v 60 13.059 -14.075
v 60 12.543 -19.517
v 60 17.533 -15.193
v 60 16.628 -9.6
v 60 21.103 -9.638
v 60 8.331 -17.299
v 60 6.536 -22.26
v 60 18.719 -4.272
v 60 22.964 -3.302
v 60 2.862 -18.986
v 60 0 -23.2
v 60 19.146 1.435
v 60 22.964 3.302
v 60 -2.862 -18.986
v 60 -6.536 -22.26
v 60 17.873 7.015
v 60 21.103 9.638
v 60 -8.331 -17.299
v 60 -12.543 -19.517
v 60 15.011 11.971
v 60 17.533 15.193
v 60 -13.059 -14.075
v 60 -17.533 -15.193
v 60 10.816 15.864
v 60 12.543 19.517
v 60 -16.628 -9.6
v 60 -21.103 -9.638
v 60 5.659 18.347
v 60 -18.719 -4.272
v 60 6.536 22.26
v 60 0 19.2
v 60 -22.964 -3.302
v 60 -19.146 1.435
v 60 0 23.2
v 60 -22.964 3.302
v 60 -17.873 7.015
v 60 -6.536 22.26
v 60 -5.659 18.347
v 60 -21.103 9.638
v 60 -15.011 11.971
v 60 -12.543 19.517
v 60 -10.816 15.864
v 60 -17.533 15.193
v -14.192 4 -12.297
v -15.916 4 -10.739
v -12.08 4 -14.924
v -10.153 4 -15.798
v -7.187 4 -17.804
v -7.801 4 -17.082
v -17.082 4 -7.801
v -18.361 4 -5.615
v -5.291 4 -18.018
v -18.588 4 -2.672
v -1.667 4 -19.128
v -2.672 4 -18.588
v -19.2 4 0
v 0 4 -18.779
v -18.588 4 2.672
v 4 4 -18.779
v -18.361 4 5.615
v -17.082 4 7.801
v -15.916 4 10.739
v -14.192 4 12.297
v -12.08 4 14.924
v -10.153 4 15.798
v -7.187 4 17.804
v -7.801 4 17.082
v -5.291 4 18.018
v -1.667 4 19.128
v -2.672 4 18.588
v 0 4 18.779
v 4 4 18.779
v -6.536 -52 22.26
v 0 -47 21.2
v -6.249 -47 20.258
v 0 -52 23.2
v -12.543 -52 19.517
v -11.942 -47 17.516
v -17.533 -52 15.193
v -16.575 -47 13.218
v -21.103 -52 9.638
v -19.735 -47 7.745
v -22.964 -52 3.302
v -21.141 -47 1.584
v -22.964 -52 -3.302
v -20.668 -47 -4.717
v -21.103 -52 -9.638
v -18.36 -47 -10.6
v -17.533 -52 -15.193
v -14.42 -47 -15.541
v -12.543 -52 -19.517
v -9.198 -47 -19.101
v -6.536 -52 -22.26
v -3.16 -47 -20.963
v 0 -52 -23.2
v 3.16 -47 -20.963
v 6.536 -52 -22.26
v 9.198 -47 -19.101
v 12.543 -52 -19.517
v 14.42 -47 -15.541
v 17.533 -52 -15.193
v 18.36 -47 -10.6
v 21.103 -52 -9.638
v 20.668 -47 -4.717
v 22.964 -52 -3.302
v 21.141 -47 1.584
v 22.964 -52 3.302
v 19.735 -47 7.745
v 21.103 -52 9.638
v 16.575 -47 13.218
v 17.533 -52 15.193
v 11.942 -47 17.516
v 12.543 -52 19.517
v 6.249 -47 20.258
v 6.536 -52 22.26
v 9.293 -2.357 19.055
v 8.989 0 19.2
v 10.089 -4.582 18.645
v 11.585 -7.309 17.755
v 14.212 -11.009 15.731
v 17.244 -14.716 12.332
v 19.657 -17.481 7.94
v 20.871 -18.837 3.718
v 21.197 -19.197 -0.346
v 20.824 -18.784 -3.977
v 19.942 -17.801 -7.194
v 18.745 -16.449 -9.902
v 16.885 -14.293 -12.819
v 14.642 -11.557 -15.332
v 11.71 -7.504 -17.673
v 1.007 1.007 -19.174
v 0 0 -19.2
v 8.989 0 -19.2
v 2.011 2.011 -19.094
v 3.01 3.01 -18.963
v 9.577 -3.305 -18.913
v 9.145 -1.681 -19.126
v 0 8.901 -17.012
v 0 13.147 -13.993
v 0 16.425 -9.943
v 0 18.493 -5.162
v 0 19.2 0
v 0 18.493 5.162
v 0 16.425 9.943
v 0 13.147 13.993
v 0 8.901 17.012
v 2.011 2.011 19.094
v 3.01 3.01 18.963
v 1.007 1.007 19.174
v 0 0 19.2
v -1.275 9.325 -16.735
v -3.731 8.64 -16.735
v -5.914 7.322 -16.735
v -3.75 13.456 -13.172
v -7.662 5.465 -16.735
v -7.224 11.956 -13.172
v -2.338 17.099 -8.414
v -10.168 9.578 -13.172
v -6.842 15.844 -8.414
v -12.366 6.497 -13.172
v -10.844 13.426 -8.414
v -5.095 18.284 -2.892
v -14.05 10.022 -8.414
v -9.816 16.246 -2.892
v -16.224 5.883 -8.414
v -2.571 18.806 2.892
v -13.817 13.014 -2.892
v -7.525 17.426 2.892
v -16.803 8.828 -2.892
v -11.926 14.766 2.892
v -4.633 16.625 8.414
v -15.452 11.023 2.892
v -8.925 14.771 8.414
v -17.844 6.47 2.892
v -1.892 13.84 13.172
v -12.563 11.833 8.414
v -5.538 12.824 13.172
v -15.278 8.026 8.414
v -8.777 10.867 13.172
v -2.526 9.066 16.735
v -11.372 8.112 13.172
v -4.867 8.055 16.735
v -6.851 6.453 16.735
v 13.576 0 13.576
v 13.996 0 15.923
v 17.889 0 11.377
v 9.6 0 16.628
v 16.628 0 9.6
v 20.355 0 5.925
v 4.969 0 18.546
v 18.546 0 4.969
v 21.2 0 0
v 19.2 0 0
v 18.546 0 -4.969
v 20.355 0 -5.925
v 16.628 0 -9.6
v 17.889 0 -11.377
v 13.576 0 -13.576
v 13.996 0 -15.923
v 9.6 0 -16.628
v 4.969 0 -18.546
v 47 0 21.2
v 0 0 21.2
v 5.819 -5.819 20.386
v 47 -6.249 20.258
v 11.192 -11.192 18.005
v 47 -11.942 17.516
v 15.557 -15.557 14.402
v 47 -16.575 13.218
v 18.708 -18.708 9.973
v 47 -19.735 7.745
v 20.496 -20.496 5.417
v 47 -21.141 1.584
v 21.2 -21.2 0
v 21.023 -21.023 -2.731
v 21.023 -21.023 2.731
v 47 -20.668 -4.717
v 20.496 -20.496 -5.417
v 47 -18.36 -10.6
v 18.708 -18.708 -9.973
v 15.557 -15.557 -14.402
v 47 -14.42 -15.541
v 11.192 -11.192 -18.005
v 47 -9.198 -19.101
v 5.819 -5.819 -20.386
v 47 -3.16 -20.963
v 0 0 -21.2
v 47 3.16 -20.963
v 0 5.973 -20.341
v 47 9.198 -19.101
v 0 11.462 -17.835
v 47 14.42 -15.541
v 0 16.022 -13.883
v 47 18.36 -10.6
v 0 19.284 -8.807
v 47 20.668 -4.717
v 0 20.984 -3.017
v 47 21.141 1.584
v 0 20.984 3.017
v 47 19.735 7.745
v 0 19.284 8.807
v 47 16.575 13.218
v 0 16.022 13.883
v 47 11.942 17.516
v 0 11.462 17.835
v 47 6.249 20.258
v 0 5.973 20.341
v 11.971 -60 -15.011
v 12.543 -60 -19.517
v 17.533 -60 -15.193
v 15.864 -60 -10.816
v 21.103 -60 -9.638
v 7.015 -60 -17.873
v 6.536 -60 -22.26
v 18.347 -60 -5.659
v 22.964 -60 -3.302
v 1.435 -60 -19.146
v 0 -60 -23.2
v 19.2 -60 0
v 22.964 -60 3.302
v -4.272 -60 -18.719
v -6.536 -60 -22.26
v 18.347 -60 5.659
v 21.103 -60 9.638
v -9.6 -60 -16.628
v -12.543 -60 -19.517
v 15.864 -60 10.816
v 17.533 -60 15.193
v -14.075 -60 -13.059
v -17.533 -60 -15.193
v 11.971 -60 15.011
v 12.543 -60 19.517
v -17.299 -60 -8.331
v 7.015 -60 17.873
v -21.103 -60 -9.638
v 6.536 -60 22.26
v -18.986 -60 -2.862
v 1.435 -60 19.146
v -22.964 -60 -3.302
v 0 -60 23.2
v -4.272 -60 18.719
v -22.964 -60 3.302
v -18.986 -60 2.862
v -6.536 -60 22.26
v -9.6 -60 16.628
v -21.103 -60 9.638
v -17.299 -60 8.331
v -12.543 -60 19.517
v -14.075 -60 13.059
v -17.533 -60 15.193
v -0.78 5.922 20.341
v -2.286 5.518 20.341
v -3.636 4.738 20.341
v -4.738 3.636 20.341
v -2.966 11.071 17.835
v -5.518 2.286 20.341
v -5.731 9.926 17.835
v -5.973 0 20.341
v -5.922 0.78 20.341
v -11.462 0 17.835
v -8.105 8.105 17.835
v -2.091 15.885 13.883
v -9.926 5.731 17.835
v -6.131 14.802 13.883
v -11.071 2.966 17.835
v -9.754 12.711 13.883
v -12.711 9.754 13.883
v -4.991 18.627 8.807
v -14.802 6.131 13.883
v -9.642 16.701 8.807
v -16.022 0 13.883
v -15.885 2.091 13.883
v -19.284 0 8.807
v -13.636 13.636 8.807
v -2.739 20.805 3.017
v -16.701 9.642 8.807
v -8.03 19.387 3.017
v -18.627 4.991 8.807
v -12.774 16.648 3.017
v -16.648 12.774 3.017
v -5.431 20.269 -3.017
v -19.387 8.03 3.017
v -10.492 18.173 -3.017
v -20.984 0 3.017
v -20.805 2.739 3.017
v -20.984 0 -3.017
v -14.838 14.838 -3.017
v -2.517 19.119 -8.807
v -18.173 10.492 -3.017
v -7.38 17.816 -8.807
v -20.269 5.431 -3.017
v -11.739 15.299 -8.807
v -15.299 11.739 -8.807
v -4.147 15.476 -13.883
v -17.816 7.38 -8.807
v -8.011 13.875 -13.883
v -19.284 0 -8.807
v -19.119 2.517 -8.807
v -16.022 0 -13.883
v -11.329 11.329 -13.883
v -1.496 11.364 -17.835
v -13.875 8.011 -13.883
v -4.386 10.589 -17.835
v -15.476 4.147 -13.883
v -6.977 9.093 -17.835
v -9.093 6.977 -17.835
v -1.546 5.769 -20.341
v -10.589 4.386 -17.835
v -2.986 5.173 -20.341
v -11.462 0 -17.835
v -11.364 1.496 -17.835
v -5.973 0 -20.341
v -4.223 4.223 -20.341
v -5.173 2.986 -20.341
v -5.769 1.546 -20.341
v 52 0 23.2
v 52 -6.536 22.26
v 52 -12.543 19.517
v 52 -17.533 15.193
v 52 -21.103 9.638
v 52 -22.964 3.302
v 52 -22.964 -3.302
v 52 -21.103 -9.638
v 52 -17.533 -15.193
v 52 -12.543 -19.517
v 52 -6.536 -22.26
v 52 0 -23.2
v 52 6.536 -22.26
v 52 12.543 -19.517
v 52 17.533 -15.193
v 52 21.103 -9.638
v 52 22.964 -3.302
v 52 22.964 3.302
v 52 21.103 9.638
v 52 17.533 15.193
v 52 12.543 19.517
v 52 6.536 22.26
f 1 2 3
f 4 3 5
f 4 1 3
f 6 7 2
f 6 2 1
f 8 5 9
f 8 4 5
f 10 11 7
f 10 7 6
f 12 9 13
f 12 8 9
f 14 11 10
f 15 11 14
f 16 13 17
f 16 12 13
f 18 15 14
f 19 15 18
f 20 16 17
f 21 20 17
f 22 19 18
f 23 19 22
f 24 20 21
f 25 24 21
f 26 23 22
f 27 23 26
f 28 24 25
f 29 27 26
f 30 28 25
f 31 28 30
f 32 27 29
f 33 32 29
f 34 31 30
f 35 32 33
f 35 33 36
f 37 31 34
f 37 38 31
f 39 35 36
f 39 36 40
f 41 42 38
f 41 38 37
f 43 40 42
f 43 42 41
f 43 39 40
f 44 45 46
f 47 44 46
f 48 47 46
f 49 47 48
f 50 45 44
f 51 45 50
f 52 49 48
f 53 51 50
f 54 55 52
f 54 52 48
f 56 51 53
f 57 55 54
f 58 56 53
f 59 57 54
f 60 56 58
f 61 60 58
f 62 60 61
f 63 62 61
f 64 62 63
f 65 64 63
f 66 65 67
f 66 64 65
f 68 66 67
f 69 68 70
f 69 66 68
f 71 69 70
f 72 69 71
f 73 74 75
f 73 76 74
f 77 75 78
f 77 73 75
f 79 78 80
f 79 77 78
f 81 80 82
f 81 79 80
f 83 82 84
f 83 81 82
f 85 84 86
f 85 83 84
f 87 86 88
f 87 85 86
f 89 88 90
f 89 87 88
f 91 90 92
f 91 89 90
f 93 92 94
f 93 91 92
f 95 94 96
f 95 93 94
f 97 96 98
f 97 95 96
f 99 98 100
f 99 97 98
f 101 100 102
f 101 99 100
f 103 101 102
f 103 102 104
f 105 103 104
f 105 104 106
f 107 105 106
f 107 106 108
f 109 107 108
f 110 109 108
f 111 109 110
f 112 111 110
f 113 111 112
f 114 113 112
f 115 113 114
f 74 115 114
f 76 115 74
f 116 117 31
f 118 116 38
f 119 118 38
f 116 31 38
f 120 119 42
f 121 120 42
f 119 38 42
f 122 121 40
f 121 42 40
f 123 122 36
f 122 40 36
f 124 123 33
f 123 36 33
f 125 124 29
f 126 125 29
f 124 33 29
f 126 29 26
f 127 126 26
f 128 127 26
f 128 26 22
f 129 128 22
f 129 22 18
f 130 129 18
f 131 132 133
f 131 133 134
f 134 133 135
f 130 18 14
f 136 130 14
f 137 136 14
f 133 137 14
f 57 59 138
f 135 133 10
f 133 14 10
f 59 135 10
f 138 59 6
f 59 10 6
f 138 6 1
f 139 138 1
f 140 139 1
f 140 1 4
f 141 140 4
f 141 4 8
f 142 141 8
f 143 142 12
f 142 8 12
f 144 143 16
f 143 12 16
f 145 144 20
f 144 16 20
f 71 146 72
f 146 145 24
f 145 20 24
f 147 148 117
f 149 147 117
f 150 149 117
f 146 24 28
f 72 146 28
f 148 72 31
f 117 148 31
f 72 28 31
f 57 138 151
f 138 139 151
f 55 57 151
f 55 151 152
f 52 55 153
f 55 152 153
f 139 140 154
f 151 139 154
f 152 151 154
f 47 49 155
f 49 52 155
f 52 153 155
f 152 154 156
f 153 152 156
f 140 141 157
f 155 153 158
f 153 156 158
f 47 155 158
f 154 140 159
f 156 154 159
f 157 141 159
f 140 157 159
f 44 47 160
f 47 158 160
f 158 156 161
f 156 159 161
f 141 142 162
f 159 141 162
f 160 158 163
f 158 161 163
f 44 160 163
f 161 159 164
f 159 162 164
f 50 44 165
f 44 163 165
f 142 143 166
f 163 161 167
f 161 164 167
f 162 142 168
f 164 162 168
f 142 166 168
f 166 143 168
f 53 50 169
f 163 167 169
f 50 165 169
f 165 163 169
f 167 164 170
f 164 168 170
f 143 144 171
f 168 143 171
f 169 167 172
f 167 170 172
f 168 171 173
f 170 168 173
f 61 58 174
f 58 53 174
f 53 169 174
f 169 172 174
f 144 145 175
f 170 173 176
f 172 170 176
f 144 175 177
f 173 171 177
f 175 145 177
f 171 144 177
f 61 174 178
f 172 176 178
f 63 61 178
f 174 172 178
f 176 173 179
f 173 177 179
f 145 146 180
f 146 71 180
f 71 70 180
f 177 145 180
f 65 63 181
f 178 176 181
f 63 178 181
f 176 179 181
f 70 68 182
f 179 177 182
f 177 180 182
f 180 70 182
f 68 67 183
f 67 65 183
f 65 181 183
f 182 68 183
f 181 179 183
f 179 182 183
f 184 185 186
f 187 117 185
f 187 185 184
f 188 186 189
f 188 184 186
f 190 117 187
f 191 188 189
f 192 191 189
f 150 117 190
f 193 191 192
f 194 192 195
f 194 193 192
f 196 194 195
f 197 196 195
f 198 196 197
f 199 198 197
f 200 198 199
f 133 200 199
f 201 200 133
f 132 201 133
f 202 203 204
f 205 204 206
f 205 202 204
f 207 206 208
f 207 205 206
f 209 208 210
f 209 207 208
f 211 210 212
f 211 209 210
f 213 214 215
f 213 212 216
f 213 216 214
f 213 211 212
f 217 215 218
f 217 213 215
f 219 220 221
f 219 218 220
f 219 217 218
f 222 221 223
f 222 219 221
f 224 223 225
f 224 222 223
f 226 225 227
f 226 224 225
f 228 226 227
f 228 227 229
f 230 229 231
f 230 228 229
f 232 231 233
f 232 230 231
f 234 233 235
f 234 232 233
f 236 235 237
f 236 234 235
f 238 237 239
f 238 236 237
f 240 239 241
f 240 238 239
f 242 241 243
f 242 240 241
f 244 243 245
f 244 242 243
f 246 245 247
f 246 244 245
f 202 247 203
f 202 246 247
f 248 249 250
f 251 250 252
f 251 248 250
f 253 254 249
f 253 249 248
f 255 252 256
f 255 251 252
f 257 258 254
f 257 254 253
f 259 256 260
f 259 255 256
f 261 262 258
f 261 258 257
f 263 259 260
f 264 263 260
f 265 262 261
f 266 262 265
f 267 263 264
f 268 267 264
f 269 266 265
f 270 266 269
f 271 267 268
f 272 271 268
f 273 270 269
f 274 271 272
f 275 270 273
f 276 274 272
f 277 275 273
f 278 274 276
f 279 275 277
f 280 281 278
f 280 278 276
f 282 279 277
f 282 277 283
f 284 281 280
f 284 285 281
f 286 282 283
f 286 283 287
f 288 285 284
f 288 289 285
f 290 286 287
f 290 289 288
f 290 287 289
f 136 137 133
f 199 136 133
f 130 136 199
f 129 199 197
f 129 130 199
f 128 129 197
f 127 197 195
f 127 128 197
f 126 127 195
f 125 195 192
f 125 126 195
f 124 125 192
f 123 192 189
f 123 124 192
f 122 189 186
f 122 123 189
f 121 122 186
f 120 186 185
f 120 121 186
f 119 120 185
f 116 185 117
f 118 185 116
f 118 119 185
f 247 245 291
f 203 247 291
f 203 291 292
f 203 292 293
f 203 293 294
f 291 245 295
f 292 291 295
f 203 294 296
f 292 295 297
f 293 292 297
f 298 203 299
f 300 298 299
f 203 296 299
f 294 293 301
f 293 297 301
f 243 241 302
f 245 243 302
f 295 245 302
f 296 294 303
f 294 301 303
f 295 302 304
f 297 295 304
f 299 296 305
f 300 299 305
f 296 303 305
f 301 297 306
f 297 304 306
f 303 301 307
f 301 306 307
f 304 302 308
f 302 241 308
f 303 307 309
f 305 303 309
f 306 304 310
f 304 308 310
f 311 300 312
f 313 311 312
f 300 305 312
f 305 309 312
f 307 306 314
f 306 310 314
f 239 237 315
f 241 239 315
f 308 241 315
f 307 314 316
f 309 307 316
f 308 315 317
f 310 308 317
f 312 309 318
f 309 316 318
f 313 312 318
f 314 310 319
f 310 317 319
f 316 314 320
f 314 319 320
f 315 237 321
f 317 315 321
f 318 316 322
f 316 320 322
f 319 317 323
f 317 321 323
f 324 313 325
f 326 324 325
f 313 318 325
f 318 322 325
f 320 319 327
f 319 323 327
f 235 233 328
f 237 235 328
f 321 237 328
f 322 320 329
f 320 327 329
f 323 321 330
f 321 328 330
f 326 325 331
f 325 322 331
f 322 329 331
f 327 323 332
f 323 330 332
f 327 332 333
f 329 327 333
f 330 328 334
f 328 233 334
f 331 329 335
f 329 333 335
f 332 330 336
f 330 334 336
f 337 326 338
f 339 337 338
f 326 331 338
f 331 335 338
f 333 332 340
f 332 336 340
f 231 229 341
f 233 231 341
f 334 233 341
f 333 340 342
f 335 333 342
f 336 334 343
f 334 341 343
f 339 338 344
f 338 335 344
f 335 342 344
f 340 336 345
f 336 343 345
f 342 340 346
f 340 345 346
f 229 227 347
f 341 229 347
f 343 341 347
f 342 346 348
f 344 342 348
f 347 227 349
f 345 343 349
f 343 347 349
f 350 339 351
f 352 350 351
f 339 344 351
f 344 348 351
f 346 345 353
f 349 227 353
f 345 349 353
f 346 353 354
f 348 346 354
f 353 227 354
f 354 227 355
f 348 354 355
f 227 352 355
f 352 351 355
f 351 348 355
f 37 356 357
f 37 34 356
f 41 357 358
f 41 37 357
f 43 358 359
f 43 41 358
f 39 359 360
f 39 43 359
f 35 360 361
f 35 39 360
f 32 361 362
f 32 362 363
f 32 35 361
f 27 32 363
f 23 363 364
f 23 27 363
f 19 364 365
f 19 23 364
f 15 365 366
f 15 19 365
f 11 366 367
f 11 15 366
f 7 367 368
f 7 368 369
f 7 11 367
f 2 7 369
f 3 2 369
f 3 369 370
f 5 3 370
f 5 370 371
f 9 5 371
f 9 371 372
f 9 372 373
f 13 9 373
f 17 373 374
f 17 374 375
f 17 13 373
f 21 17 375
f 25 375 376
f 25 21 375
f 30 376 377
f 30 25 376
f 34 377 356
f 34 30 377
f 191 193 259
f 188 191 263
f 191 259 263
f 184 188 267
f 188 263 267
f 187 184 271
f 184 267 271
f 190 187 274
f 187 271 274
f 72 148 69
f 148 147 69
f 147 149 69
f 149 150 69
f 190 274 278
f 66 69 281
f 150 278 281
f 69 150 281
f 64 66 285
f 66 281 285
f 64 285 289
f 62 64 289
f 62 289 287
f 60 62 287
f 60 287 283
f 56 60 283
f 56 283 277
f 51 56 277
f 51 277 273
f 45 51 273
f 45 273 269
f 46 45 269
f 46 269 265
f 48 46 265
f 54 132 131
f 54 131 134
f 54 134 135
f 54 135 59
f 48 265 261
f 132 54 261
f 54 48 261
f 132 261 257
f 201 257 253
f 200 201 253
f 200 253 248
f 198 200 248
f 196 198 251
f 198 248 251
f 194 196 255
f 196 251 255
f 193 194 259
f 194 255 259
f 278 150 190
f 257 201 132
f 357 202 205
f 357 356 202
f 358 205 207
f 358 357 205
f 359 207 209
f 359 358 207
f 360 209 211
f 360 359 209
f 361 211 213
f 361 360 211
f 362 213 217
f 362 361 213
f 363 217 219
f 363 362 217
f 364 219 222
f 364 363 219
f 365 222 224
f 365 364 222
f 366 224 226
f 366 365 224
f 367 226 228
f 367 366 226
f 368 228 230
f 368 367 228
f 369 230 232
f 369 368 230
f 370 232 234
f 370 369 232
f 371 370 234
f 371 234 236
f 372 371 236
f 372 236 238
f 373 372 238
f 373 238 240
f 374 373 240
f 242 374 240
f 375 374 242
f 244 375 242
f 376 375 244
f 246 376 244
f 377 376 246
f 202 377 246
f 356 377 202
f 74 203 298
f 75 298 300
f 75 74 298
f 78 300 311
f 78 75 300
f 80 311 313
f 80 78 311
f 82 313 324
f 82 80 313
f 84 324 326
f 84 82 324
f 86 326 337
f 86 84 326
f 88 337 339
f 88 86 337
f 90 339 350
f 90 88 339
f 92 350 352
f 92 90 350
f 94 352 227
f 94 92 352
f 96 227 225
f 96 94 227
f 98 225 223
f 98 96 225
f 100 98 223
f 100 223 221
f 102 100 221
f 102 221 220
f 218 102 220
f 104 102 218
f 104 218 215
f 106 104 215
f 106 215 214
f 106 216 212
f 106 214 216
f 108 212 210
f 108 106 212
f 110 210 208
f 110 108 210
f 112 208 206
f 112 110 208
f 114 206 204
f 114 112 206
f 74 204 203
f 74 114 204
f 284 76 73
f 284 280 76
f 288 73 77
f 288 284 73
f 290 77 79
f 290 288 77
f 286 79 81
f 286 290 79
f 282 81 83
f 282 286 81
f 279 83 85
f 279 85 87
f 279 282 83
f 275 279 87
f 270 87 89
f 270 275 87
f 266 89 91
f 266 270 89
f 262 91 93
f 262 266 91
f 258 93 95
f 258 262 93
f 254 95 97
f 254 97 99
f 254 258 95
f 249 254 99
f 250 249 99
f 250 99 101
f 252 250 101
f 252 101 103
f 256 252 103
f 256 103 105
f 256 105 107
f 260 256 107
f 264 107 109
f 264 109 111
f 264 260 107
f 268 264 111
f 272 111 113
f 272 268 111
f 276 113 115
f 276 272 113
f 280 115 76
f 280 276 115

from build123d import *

# Parameters (mm, degrees)
SKETCH001_R          = 19.2
POCKET_DEPTH         = 60.001
POCKET001_DEPTH      = 23.201
POCKET001_DEPTH_BACK = -23.201
REVOLUTION001_ANGLE  = 90
SKETCH004_R          = 19.2
POCKET002_DEPTH      = 64


with BuildPart() as part:
    # Sketch → Revolution (revolve)
    with BuildSketch(Plane.XZ):
        Polygon((0, 0), (0, 21.2), (47, 21.2), (52, 23.2), (60, 23.2), (60, 0), align=None)
    revolve(axis=Axis((0, 0, 0), (1, 0, 0)))

    # Sketch001 (on Face5 of Revolution) → Pocket (cut, through all)
    with BuildSketch(Plane(origin=(60, 0, 0), x_dir=(0, 0, 1), z_dir=(1, 0, 0))):
        Circle(SKETCH001_R)
    extrude(amount=-POCKET_DEPTH, mode=Mode.SUBTRACT)

    # Sketch002 → Pocket001 (cut, two sides)
    with BuildSketch(Plane.XY) as pocket001_sk:
        Polygon((0, 0), (35.582964, -35.582964), (0, -35.582964), align=None)
    extrude(amount=-POCKET001_DEPTH, mode=Mode.SUBTRACT)
    extrude(pocket001_sk.sketch, amount=-POCKET001_DEPTH_BACK, mode=Mode.SUBTRACT)

    # Pocket001 Face1 → Revolution001 (revolve)
    with BuildSketch(Plane(origin=(0, 12.870225, 0), x_dir=(0, 1, 0), z_dir=(-1, 0, 0))):
        with BuildLine():
            Line((-12.870225, -19.2), (-12.870225, -21.2))
            ThreePointArc((-12.870225, -21.2), (8.329775, 0), (-12.870225, 21.2))
            Line((-12.870225, 21.2), (-12.870225, 19.2))
            ThreePointArc((-12.870225, 19.2), (6.329775, 0), (-12.870225, -19.2))
        make_face()
    revolve(axis=Axis((0, 0, 0), (0, 0, 1)), revolution_arc=REVOLUTION001_ANGLE)

    # Sketch003 → Revolution002 (revolve)
    with BuildSketch(Plane(origin=(0, 0, 0), x_dir=(0, -1, 0), z_dir=(-1, 0, 0))):
        Polygon((0, 0), (0, 21.2), (47, 21.2), (52, 23.2), (60, 23.2), (60, 0), align=None)
    revolve(axis=Axis((0, 0, 0), (0, -1, 0)))

    # Sketch004 (on Face9 of Revolution002) → Pocket002 (cut)
    with BuildSketch(Plane.XZ.offset(60)):
        Circle(SKETCH004_R)
    extrude(amount=-POCKET002_DEPTH, mode=Mode.SUBTRACT)


solid = part.part
